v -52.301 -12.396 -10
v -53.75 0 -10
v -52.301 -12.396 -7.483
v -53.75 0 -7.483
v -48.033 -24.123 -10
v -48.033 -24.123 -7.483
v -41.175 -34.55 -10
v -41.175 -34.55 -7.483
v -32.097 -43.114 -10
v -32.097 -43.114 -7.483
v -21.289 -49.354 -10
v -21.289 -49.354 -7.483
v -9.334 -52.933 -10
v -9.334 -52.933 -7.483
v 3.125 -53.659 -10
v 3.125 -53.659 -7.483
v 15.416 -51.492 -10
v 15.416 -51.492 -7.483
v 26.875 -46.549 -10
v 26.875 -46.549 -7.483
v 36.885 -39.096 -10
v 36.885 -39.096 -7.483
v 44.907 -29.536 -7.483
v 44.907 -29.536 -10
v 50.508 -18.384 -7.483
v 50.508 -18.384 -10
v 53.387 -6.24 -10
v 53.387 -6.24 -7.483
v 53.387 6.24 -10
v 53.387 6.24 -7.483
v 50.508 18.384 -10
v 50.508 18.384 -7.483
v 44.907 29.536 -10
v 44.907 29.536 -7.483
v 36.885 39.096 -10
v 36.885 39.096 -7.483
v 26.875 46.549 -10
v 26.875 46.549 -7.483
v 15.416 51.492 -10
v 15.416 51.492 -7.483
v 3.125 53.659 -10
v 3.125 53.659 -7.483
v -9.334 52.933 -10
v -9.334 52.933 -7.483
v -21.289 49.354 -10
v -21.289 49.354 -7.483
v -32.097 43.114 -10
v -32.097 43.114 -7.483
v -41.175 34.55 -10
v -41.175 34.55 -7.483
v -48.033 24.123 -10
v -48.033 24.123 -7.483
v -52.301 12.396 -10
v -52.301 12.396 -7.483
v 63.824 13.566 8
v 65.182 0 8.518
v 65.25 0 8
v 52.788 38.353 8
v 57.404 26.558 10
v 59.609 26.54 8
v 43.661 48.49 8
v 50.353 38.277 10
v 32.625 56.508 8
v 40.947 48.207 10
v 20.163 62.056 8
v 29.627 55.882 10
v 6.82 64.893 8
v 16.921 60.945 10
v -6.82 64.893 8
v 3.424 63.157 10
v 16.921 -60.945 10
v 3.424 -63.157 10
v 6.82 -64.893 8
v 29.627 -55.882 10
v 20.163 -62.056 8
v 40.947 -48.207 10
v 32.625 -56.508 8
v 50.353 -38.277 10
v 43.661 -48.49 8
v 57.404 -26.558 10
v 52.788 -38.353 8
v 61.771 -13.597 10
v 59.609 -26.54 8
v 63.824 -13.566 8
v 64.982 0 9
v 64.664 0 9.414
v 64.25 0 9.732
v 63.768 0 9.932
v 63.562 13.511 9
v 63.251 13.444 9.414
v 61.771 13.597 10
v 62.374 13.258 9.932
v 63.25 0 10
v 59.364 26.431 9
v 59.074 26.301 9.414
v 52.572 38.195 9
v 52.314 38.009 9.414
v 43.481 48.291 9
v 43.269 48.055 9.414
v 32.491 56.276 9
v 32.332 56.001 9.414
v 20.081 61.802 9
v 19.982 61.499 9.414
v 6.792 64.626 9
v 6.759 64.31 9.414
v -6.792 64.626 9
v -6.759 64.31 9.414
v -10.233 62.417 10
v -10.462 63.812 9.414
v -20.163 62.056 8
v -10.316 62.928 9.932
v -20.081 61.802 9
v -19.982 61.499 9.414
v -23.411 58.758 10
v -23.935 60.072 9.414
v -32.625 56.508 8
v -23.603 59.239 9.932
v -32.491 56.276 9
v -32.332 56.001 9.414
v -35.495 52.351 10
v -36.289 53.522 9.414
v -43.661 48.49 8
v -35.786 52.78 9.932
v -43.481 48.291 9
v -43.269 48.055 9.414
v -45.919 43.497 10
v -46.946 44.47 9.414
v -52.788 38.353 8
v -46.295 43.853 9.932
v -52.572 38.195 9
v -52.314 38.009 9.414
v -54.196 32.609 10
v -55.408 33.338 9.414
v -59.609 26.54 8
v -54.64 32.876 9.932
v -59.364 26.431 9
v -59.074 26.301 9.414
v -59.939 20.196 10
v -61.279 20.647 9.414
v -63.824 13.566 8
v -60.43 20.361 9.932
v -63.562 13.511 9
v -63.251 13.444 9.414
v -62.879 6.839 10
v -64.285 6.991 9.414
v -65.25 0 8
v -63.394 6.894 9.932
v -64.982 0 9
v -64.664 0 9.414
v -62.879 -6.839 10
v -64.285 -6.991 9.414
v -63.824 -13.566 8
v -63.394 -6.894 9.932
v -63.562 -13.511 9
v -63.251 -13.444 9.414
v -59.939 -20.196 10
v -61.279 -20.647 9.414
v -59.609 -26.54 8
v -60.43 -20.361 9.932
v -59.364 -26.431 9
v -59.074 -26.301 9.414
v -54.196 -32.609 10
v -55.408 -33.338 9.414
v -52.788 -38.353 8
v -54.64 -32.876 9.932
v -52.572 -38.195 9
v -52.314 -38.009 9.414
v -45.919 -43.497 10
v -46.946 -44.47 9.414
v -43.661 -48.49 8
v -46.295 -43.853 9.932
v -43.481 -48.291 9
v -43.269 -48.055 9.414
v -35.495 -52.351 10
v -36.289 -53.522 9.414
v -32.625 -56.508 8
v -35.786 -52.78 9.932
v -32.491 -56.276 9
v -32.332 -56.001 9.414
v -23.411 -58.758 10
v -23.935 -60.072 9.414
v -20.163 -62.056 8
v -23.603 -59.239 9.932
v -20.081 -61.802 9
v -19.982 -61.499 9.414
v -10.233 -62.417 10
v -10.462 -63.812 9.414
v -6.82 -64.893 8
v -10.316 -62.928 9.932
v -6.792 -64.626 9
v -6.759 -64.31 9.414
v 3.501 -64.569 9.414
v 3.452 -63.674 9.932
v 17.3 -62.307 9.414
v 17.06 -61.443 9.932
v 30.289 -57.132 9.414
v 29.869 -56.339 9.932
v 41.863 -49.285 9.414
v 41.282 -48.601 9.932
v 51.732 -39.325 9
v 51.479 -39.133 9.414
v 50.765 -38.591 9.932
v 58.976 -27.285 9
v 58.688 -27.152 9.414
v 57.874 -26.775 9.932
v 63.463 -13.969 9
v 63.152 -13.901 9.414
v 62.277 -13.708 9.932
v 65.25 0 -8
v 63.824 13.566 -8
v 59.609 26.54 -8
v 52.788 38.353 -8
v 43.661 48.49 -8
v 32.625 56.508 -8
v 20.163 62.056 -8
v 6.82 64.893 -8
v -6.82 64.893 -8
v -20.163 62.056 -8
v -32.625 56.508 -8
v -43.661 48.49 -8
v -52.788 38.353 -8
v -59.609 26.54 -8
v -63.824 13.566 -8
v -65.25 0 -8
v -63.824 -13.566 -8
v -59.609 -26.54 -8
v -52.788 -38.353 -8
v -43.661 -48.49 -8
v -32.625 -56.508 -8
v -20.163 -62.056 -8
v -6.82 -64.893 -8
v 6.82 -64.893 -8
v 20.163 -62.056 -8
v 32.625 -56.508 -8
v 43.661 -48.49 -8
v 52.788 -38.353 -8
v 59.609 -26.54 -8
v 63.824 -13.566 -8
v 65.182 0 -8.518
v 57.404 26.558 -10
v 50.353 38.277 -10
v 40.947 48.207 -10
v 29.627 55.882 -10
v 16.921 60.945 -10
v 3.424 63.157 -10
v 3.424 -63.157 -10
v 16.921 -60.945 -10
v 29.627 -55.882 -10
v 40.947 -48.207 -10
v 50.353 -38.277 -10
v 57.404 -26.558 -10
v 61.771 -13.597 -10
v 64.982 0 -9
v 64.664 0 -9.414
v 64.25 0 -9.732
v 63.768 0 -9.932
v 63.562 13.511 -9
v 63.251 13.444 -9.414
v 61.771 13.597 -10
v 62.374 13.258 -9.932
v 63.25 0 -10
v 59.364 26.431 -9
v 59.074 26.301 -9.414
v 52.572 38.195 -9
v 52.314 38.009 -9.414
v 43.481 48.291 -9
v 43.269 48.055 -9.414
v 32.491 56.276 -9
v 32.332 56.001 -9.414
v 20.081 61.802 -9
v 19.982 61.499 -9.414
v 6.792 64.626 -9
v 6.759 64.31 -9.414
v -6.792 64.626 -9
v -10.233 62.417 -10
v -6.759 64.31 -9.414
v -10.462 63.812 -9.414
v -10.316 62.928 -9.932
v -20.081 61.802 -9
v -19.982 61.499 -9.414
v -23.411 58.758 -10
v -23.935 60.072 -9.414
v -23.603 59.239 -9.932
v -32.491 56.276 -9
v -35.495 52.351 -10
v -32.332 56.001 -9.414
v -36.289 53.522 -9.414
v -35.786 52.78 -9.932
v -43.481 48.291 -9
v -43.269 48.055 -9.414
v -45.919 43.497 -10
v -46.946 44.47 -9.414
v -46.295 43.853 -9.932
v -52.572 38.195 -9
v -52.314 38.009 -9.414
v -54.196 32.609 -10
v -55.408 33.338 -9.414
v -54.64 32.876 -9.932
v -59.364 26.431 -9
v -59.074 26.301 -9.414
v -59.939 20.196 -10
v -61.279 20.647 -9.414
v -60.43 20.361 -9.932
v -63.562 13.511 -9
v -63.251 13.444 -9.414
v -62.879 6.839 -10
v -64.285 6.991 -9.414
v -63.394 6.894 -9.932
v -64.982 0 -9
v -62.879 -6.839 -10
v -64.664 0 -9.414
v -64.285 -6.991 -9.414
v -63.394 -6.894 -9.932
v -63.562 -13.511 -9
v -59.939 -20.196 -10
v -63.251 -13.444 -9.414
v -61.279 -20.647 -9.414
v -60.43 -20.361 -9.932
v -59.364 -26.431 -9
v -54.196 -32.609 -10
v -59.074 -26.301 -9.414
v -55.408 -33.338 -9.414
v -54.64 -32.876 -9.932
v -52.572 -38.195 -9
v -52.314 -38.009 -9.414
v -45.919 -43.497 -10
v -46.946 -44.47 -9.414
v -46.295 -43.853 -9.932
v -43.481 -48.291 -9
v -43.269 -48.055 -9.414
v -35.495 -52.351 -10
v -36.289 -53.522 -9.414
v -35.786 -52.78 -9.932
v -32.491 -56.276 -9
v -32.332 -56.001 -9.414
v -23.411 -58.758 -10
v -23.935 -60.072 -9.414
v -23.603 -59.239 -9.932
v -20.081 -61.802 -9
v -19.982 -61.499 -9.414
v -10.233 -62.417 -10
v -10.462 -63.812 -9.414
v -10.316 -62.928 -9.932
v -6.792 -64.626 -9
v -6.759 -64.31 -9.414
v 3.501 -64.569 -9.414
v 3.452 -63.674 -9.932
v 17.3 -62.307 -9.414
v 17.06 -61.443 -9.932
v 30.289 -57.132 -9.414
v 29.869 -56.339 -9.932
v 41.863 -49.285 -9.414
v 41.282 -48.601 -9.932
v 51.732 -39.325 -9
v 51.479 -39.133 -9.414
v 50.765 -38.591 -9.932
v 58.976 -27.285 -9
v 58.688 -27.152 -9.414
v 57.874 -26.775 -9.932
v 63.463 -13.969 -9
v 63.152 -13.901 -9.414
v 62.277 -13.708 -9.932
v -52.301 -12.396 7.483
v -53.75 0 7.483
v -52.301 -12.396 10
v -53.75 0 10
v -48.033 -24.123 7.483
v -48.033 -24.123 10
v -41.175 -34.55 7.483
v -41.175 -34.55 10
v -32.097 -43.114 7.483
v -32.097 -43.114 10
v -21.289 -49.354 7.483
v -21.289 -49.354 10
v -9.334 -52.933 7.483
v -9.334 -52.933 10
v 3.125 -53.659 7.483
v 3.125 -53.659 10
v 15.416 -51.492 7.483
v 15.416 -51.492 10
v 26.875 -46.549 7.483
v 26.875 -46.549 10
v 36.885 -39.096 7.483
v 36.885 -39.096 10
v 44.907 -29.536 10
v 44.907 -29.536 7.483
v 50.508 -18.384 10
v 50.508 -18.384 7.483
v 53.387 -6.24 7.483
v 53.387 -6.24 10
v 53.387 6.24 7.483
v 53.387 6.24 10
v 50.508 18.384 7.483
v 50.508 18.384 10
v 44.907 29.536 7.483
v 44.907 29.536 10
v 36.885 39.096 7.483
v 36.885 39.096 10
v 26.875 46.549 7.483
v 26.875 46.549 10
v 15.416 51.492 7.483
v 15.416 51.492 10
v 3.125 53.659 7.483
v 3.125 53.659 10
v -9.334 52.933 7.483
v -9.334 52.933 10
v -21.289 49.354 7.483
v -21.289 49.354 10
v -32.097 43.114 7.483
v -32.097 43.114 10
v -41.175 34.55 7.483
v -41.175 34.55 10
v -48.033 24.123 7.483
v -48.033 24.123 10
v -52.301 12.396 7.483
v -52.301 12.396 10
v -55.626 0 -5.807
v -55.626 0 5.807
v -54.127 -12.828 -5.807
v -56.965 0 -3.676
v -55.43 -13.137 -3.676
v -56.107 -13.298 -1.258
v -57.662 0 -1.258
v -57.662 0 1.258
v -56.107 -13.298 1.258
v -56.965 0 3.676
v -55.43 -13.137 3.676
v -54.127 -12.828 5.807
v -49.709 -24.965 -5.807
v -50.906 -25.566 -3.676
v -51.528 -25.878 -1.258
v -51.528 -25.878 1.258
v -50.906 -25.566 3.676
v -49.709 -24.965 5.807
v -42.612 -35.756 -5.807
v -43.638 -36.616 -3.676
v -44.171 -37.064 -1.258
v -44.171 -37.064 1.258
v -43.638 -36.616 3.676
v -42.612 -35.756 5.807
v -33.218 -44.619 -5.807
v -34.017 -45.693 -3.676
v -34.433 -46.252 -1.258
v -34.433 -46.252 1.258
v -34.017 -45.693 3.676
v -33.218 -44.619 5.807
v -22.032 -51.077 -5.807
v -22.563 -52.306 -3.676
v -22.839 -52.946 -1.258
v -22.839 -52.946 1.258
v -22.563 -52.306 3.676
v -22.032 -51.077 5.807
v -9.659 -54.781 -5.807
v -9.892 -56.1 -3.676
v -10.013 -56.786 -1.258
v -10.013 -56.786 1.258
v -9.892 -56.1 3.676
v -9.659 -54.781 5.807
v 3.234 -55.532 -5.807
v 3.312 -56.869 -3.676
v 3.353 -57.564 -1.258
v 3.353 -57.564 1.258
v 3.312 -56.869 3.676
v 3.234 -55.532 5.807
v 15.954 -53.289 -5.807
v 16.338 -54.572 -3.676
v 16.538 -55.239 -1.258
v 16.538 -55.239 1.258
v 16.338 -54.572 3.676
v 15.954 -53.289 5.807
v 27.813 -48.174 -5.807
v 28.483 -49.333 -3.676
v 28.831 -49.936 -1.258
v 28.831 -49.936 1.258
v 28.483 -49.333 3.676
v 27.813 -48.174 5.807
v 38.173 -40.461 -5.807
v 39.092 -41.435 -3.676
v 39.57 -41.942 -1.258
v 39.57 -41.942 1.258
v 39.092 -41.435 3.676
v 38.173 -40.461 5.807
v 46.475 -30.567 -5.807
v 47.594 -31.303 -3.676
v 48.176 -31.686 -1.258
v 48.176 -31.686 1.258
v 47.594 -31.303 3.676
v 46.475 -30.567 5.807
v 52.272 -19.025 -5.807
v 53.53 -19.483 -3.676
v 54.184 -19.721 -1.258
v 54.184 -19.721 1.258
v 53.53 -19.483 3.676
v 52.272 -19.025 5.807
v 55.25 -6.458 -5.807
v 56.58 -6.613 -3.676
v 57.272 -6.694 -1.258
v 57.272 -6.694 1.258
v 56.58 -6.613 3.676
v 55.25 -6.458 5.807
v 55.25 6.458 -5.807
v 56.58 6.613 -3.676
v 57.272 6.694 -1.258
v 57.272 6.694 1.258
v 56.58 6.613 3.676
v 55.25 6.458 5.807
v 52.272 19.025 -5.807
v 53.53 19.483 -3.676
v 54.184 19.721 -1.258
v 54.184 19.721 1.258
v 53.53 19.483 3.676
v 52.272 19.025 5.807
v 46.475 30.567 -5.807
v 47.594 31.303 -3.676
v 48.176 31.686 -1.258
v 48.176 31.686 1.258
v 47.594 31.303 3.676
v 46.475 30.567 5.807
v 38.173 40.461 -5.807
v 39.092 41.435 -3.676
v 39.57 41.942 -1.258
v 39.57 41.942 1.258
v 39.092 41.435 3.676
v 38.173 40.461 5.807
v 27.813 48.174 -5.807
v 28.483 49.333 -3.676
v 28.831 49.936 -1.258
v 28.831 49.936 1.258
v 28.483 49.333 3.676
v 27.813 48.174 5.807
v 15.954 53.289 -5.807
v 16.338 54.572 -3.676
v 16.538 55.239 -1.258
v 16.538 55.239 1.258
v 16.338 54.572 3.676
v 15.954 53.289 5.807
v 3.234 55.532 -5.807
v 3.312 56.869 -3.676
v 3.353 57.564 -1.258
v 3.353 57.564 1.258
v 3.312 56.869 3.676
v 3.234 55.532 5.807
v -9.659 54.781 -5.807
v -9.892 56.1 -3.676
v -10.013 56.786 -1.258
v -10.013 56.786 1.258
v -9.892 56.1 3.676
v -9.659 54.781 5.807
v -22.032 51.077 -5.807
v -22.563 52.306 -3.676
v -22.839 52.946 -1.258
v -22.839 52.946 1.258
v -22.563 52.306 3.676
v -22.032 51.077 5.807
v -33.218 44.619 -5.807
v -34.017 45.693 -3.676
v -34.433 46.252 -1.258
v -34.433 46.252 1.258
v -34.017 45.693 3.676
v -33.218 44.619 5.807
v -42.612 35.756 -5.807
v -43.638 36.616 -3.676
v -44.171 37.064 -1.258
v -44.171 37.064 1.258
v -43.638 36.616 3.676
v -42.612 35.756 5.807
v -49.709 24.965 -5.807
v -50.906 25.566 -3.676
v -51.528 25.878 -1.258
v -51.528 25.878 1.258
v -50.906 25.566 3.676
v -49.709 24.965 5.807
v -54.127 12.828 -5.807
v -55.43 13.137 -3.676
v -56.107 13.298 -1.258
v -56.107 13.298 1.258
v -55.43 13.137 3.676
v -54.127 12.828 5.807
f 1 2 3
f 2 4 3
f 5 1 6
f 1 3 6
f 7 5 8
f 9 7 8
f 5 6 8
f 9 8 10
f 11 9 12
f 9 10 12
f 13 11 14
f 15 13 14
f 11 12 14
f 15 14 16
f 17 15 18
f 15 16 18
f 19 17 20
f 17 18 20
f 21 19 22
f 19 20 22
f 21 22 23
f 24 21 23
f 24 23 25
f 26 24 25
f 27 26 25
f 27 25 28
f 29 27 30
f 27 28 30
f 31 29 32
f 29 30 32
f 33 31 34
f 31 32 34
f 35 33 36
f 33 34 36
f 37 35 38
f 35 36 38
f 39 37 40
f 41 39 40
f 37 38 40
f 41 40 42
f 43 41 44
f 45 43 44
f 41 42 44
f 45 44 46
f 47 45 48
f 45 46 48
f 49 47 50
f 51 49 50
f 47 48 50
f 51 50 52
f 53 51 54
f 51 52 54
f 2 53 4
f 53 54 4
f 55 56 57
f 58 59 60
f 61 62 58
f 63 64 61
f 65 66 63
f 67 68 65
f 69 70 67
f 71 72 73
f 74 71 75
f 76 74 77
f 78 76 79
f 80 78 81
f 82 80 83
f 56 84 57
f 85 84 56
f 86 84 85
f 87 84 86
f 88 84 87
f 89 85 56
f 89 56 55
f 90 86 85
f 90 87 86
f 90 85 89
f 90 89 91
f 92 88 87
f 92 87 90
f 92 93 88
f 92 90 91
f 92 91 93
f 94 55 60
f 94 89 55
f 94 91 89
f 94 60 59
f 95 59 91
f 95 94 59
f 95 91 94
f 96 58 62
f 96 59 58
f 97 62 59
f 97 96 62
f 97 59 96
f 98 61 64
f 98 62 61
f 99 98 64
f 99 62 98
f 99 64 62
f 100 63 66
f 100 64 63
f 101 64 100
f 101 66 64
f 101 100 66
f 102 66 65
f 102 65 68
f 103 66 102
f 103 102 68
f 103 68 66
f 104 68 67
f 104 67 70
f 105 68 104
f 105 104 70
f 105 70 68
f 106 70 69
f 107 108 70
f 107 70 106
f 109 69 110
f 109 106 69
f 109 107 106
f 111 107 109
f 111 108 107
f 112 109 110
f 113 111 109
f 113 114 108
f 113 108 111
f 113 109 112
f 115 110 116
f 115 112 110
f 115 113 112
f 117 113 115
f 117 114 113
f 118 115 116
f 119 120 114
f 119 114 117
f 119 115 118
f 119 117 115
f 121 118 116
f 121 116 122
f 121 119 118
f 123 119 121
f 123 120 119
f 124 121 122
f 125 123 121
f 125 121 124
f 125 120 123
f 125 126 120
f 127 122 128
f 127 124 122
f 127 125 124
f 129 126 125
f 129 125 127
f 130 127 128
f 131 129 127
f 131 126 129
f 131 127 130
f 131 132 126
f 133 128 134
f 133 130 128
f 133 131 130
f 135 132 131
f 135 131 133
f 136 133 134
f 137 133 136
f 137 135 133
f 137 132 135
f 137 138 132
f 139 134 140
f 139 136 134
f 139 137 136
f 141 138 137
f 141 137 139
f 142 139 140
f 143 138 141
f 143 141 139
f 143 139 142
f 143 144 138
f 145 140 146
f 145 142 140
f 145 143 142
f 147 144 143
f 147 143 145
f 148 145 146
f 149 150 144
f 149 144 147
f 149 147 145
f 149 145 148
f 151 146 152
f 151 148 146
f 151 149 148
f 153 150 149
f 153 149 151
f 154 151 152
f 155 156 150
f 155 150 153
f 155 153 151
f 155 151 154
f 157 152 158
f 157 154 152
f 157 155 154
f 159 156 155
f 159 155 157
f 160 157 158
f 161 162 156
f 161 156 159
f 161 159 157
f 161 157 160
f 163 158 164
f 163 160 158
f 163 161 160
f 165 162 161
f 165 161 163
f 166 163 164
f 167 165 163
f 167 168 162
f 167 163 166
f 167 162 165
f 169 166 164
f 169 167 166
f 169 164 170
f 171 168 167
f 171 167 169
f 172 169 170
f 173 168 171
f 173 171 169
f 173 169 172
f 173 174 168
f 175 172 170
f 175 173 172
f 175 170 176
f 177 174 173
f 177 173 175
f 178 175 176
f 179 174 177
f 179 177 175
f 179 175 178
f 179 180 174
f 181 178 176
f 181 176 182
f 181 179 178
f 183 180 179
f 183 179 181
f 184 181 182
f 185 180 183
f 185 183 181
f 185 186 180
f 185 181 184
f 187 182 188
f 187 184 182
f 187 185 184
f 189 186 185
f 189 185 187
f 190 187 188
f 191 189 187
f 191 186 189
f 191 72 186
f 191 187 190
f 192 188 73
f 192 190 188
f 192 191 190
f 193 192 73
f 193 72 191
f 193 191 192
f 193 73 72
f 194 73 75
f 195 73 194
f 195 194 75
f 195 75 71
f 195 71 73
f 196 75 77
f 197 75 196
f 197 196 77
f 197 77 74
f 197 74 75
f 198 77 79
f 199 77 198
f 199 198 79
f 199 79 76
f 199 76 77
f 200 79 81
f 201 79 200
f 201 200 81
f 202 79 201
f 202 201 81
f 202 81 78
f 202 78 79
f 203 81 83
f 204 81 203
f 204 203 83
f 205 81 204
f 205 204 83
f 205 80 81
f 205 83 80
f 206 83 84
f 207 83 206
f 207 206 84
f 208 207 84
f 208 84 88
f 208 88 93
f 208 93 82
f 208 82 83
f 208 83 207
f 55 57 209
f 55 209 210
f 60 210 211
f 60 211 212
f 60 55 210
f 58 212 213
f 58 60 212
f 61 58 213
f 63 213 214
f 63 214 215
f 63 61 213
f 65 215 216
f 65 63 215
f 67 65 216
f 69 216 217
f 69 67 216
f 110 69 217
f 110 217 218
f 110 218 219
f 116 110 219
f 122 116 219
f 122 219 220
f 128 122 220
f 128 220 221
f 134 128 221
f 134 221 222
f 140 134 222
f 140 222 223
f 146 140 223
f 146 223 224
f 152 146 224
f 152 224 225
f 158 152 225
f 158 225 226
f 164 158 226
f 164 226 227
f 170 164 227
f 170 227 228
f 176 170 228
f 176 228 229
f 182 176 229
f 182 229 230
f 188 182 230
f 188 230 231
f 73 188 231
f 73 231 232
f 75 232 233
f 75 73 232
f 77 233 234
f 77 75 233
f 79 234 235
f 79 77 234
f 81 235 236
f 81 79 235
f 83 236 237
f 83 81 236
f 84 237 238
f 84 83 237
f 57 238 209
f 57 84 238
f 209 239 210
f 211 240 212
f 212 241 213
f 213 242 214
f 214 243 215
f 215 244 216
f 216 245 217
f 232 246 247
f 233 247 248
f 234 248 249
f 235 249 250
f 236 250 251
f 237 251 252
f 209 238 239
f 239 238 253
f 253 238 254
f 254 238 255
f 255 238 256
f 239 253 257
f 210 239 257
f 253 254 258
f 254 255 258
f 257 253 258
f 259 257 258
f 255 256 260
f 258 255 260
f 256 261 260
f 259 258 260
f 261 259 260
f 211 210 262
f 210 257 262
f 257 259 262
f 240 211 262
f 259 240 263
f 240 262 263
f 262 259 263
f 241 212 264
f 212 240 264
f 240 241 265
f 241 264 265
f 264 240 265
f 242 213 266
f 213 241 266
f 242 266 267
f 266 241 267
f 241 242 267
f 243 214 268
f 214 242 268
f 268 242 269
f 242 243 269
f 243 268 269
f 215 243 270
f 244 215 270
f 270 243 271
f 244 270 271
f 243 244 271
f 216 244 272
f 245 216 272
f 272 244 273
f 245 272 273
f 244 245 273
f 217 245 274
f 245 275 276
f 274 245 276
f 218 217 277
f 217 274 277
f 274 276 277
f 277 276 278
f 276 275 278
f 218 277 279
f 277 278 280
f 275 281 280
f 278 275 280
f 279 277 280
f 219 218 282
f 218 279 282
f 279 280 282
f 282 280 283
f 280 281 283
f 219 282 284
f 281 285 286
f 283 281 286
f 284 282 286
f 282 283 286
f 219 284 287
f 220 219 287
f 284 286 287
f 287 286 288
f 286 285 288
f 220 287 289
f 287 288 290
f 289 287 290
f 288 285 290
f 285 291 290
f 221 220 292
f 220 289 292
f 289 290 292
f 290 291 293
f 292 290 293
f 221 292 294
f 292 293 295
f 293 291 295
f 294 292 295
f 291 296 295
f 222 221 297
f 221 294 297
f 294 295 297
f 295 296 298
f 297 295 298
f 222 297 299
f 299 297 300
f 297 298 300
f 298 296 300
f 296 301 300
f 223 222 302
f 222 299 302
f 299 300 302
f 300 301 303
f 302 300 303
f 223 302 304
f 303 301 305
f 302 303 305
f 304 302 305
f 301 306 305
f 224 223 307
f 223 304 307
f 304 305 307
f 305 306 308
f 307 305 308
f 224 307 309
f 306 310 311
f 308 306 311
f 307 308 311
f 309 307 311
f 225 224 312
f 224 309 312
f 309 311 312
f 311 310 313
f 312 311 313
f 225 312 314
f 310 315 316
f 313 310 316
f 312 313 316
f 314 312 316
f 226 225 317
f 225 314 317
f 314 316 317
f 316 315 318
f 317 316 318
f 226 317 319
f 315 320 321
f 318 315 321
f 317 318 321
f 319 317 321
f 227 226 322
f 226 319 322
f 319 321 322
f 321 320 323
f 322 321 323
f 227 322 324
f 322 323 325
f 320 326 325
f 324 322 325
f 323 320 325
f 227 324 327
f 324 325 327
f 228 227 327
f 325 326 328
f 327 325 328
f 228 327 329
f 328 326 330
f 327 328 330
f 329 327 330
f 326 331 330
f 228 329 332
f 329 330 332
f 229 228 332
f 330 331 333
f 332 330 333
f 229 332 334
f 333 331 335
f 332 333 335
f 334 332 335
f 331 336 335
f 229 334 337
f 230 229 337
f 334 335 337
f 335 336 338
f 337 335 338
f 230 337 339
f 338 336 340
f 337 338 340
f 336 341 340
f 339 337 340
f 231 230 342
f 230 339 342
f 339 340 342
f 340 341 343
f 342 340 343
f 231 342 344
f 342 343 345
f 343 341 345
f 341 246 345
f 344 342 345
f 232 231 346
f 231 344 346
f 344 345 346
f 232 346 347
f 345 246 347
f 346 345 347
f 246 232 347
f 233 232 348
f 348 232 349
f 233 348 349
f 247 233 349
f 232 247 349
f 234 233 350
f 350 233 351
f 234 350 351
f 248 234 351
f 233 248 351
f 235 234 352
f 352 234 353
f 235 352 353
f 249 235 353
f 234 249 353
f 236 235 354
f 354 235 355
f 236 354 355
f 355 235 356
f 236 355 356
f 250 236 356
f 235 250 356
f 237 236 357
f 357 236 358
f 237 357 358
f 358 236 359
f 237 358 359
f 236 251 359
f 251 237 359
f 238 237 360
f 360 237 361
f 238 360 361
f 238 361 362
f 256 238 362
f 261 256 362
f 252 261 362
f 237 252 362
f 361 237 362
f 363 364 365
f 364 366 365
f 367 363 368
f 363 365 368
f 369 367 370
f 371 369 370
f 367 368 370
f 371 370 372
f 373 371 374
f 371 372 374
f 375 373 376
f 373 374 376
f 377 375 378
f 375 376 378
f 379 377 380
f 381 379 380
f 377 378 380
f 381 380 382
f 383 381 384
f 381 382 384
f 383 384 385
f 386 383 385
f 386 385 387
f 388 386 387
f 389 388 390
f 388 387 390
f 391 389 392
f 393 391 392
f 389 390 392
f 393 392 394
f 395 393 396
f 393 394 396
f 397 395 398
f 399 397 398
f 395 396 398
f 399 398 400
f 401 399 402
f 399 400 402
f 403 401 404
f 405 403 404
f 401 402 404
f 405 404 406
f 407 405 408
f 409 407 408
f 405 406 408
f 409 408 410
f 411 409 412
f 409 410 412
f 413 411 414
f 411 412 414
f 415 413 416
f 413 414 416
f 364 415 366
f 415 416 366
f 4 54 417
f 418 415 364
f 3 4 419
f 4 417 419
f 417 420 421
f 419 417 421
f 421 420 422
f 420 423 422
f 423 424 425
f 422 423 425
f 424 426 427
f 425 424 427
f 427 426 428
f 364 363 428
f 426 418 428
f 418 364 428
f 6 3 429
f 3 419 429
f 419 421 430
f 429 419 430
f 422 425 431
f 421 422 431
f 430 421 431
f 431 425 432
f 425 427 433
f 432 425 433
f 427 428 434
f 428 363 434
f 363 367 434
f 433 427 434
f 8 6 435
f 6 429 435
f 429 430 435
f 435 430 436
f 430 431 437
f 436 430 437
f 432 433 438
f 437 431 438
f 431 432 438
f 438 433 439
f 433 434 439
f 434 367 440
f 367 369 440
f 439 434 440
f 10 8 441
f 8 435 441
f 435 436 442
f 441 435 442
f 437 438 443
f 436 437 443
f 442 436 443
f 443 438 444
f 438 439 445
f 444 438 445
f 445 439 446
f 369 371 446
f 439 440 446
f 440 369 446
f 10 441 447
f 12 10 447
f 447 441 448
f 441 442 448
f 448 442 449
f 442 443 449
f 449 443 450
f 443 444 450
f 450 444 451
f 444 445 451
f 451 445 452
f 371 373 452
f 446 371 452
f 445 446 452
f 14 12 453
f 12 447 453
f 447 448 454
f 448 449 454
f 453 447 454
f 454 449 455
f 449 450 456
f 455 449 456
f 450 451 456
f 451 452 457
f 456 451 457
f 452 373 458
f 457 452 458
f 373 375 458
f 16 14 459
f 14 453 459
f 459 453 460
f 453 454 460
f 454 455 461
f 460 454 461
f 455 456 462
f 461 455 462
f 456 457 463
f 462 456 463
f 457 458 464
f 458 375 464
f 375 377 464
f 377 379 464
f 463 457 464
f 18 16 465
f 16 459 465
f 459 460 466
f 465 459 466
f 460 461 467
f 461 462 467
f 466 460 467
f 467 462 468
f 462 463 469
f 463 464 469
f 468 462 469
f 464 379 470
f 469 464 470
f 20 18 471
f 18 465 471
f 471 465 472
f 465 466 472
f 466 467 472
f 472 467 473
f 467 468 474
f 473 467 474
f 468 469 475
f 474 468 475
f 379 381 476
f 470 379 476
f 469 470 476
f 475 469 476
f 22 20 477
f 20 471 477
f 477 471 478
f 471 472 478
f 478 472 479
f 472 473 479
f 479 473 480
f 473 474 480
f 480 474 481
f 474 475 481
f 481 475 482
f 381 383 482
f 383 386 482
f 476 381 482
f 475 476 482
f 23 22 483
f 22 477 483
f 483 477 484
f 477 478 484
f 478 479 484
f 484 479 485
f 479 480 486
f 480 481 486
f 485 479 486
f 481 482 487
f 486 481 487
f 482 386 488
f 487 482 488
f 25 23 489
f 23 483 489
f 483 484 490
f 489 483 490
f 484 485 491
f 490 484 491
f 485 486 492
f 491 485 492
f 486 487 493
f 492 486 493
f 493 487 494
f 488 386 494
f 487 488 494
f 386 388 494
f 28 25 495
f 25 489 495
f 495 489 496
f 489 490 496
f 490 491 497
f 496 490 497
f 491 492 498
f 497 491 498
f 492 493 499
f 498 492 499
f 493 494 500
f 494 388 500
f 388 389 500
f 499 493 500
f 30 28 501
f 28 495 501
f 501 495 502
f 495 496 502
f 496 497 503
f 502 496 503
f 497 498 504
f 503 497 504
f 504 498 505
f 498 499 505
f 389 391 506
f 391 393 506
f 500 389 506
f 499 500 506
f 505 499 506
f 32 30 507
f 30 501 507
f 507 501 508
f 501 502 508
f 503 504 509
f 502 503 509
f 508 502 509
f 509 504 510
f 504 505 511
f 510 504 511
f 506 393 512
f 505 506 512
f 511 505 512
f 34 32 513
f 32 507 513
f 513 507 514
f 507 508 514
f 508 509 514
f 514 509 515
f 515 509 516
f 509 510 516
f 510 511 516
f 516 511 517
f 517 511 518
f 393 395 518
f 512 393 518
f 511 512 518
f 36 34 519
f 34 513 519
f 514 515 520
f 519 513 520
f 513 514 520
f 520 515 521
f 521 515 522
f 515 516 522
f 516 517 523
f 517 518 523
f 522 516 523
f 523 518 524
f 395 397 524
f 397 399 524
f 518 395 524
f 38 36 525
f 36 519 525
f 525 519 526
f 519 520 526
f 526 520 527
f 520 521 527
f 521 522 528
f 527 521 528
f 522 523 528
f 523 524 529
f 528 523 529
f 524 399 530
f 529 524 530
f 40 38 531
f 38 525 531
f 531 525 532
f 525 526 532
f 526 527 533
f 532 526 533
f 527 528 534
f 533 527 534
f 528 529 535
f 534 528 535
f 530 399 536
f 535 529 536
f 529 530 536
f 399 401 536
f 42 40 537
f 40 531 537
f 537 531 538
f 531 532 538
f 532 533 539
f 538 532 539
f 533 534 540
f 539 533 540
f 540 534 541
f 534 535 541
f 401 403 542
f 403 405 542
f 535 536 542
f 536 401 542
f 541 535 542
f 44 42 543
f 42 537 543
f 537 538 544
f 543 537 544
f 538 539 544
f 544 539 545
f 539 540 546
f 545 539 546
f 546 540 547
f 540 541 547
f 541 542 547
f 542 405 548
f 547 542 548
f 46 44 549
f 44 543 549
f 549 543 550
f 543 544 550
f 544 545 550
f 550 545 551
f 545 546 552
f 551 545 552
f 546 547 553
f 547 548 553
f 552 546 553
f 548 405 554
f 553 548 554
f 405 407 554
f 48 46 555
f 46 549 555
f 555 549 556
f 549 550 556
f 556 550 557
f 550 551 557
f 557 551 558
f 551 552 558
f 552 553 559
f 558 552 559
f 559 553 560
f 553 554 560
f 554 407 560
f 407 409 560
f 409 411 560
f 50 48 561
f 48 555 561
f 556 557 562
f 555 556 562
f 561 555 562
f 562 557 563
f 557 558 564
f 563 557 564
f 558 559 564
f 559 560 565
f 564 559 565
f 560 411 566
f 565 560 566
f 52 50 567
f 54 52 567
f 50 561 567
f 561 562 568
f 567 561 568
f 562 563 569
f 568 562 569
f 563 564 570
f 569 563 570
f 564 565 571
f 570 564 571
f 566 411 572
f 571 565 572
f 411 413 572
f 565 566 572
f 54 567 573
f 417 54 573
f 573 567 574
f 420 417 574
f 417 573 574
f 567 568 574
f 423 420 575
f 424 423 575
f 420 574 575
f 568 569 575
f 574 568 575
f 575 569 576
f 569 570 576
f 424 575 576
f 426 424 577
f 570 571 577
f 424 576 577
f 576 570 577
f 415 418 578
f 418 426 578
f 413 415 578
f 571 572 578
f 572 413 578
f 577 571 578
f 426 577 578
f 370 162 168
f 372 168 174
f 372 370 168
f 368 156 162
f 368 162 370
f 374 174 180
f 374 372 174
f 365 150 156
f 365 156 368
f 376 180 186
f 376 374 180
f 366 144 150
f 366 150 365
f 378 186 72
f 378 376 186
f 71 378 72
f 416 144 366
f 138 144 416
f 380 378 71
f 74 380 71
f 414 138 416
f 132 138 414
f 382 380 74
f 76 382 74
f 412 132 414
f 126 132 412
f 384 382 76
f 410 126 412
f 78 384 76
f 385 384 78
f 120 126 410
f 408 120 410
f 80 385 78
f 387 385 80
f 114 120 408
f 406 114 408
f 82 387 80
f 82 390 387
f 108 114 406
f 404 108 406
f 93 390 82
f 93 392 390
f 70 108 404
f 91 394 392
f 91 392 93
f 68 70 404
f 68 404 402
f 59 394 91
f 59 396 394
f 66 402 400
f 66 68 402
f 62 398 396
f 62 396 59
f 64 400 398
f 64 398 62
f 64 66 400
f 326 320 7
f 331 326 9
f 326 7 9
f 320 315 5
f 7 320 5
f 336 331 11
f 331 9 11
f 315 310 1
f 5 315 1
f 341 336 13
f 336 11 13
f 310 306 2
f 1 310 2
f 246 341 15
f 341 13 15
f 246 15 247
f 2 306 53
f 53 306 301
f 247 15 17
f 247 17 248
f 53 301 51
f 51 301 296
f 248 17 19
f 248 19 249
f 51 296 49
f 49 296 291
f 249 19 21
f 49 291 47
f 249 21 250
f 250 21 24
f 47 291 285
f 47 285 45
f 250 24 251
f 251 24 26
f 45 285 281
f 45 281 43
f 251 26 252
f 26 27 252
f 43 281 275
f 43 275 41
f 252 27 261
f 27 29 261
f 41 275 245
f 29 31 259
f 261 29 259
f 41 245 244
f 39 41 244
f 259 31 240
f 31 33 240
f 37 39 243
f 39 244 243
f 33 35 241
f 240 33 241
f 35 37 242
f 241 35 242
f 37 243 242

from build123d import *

# Parameters (mm, degrees)
SKETCH_1_R      = 65.25
SKETCH_1_R_2    = 50.25
EXTRUDE_1_DEPTH = 10
FILLET_1_R      = 2


with BuildPart() as part:
    # 草图1 → 凸台-拉伸1 (new, symmetric)
    with BuildSketch(Plane.XY):
        Circle(SKETCH_1_R)
        Circle(SKETCH_1_R_2, mode=Mode.SUBTRACT)
    extrude(amount=EXTRUDE_1_DEPTH, both=True)

    # 草图2 → 切除-旋转2 (revolve, cut)
    with BuildSketch(Plane(origin=(0, 0, 0), x_dir=(1, 0, 0), z_dir=(0, 1, 0)), mode=Mode.PRIVATE) as cut_revolve_2_sk:
        with BuildLine():
            Line((53.75, 10), (53.75, 7.483314774))
            ThreePointArc((53.75, 7.483314774), (57.75, 0), (53.75, -7.483314774))
            Line((53.75, -7.483314774), (53.75, -10))
            Line((53.75, -10), (42.293700596, -10))
            Line((42.293700596, -10), (42.293700596, 10))
            Line((42.293700596, 10), (53.75, 10))
        make_face()
    revolve(cut_revolve_2_sk.sketch.rotate(Axis((0, 0, -25.196328101), (0, 0, 1)), 180), axis=Axis((0, 0, -25.196328101), (0, 0, 1)), mode=Mode.SUBTRACT)

    # 圆角1
    fillet_1_edges = [part.edges().sort_by_distance(p)[0] for p in [
        (-65.25, 0, -10),
        (-65.25, 0, 10),
    ]]
    fillet(fillet_1_edges, radius=FILLET_1_R)


solid = part.part
